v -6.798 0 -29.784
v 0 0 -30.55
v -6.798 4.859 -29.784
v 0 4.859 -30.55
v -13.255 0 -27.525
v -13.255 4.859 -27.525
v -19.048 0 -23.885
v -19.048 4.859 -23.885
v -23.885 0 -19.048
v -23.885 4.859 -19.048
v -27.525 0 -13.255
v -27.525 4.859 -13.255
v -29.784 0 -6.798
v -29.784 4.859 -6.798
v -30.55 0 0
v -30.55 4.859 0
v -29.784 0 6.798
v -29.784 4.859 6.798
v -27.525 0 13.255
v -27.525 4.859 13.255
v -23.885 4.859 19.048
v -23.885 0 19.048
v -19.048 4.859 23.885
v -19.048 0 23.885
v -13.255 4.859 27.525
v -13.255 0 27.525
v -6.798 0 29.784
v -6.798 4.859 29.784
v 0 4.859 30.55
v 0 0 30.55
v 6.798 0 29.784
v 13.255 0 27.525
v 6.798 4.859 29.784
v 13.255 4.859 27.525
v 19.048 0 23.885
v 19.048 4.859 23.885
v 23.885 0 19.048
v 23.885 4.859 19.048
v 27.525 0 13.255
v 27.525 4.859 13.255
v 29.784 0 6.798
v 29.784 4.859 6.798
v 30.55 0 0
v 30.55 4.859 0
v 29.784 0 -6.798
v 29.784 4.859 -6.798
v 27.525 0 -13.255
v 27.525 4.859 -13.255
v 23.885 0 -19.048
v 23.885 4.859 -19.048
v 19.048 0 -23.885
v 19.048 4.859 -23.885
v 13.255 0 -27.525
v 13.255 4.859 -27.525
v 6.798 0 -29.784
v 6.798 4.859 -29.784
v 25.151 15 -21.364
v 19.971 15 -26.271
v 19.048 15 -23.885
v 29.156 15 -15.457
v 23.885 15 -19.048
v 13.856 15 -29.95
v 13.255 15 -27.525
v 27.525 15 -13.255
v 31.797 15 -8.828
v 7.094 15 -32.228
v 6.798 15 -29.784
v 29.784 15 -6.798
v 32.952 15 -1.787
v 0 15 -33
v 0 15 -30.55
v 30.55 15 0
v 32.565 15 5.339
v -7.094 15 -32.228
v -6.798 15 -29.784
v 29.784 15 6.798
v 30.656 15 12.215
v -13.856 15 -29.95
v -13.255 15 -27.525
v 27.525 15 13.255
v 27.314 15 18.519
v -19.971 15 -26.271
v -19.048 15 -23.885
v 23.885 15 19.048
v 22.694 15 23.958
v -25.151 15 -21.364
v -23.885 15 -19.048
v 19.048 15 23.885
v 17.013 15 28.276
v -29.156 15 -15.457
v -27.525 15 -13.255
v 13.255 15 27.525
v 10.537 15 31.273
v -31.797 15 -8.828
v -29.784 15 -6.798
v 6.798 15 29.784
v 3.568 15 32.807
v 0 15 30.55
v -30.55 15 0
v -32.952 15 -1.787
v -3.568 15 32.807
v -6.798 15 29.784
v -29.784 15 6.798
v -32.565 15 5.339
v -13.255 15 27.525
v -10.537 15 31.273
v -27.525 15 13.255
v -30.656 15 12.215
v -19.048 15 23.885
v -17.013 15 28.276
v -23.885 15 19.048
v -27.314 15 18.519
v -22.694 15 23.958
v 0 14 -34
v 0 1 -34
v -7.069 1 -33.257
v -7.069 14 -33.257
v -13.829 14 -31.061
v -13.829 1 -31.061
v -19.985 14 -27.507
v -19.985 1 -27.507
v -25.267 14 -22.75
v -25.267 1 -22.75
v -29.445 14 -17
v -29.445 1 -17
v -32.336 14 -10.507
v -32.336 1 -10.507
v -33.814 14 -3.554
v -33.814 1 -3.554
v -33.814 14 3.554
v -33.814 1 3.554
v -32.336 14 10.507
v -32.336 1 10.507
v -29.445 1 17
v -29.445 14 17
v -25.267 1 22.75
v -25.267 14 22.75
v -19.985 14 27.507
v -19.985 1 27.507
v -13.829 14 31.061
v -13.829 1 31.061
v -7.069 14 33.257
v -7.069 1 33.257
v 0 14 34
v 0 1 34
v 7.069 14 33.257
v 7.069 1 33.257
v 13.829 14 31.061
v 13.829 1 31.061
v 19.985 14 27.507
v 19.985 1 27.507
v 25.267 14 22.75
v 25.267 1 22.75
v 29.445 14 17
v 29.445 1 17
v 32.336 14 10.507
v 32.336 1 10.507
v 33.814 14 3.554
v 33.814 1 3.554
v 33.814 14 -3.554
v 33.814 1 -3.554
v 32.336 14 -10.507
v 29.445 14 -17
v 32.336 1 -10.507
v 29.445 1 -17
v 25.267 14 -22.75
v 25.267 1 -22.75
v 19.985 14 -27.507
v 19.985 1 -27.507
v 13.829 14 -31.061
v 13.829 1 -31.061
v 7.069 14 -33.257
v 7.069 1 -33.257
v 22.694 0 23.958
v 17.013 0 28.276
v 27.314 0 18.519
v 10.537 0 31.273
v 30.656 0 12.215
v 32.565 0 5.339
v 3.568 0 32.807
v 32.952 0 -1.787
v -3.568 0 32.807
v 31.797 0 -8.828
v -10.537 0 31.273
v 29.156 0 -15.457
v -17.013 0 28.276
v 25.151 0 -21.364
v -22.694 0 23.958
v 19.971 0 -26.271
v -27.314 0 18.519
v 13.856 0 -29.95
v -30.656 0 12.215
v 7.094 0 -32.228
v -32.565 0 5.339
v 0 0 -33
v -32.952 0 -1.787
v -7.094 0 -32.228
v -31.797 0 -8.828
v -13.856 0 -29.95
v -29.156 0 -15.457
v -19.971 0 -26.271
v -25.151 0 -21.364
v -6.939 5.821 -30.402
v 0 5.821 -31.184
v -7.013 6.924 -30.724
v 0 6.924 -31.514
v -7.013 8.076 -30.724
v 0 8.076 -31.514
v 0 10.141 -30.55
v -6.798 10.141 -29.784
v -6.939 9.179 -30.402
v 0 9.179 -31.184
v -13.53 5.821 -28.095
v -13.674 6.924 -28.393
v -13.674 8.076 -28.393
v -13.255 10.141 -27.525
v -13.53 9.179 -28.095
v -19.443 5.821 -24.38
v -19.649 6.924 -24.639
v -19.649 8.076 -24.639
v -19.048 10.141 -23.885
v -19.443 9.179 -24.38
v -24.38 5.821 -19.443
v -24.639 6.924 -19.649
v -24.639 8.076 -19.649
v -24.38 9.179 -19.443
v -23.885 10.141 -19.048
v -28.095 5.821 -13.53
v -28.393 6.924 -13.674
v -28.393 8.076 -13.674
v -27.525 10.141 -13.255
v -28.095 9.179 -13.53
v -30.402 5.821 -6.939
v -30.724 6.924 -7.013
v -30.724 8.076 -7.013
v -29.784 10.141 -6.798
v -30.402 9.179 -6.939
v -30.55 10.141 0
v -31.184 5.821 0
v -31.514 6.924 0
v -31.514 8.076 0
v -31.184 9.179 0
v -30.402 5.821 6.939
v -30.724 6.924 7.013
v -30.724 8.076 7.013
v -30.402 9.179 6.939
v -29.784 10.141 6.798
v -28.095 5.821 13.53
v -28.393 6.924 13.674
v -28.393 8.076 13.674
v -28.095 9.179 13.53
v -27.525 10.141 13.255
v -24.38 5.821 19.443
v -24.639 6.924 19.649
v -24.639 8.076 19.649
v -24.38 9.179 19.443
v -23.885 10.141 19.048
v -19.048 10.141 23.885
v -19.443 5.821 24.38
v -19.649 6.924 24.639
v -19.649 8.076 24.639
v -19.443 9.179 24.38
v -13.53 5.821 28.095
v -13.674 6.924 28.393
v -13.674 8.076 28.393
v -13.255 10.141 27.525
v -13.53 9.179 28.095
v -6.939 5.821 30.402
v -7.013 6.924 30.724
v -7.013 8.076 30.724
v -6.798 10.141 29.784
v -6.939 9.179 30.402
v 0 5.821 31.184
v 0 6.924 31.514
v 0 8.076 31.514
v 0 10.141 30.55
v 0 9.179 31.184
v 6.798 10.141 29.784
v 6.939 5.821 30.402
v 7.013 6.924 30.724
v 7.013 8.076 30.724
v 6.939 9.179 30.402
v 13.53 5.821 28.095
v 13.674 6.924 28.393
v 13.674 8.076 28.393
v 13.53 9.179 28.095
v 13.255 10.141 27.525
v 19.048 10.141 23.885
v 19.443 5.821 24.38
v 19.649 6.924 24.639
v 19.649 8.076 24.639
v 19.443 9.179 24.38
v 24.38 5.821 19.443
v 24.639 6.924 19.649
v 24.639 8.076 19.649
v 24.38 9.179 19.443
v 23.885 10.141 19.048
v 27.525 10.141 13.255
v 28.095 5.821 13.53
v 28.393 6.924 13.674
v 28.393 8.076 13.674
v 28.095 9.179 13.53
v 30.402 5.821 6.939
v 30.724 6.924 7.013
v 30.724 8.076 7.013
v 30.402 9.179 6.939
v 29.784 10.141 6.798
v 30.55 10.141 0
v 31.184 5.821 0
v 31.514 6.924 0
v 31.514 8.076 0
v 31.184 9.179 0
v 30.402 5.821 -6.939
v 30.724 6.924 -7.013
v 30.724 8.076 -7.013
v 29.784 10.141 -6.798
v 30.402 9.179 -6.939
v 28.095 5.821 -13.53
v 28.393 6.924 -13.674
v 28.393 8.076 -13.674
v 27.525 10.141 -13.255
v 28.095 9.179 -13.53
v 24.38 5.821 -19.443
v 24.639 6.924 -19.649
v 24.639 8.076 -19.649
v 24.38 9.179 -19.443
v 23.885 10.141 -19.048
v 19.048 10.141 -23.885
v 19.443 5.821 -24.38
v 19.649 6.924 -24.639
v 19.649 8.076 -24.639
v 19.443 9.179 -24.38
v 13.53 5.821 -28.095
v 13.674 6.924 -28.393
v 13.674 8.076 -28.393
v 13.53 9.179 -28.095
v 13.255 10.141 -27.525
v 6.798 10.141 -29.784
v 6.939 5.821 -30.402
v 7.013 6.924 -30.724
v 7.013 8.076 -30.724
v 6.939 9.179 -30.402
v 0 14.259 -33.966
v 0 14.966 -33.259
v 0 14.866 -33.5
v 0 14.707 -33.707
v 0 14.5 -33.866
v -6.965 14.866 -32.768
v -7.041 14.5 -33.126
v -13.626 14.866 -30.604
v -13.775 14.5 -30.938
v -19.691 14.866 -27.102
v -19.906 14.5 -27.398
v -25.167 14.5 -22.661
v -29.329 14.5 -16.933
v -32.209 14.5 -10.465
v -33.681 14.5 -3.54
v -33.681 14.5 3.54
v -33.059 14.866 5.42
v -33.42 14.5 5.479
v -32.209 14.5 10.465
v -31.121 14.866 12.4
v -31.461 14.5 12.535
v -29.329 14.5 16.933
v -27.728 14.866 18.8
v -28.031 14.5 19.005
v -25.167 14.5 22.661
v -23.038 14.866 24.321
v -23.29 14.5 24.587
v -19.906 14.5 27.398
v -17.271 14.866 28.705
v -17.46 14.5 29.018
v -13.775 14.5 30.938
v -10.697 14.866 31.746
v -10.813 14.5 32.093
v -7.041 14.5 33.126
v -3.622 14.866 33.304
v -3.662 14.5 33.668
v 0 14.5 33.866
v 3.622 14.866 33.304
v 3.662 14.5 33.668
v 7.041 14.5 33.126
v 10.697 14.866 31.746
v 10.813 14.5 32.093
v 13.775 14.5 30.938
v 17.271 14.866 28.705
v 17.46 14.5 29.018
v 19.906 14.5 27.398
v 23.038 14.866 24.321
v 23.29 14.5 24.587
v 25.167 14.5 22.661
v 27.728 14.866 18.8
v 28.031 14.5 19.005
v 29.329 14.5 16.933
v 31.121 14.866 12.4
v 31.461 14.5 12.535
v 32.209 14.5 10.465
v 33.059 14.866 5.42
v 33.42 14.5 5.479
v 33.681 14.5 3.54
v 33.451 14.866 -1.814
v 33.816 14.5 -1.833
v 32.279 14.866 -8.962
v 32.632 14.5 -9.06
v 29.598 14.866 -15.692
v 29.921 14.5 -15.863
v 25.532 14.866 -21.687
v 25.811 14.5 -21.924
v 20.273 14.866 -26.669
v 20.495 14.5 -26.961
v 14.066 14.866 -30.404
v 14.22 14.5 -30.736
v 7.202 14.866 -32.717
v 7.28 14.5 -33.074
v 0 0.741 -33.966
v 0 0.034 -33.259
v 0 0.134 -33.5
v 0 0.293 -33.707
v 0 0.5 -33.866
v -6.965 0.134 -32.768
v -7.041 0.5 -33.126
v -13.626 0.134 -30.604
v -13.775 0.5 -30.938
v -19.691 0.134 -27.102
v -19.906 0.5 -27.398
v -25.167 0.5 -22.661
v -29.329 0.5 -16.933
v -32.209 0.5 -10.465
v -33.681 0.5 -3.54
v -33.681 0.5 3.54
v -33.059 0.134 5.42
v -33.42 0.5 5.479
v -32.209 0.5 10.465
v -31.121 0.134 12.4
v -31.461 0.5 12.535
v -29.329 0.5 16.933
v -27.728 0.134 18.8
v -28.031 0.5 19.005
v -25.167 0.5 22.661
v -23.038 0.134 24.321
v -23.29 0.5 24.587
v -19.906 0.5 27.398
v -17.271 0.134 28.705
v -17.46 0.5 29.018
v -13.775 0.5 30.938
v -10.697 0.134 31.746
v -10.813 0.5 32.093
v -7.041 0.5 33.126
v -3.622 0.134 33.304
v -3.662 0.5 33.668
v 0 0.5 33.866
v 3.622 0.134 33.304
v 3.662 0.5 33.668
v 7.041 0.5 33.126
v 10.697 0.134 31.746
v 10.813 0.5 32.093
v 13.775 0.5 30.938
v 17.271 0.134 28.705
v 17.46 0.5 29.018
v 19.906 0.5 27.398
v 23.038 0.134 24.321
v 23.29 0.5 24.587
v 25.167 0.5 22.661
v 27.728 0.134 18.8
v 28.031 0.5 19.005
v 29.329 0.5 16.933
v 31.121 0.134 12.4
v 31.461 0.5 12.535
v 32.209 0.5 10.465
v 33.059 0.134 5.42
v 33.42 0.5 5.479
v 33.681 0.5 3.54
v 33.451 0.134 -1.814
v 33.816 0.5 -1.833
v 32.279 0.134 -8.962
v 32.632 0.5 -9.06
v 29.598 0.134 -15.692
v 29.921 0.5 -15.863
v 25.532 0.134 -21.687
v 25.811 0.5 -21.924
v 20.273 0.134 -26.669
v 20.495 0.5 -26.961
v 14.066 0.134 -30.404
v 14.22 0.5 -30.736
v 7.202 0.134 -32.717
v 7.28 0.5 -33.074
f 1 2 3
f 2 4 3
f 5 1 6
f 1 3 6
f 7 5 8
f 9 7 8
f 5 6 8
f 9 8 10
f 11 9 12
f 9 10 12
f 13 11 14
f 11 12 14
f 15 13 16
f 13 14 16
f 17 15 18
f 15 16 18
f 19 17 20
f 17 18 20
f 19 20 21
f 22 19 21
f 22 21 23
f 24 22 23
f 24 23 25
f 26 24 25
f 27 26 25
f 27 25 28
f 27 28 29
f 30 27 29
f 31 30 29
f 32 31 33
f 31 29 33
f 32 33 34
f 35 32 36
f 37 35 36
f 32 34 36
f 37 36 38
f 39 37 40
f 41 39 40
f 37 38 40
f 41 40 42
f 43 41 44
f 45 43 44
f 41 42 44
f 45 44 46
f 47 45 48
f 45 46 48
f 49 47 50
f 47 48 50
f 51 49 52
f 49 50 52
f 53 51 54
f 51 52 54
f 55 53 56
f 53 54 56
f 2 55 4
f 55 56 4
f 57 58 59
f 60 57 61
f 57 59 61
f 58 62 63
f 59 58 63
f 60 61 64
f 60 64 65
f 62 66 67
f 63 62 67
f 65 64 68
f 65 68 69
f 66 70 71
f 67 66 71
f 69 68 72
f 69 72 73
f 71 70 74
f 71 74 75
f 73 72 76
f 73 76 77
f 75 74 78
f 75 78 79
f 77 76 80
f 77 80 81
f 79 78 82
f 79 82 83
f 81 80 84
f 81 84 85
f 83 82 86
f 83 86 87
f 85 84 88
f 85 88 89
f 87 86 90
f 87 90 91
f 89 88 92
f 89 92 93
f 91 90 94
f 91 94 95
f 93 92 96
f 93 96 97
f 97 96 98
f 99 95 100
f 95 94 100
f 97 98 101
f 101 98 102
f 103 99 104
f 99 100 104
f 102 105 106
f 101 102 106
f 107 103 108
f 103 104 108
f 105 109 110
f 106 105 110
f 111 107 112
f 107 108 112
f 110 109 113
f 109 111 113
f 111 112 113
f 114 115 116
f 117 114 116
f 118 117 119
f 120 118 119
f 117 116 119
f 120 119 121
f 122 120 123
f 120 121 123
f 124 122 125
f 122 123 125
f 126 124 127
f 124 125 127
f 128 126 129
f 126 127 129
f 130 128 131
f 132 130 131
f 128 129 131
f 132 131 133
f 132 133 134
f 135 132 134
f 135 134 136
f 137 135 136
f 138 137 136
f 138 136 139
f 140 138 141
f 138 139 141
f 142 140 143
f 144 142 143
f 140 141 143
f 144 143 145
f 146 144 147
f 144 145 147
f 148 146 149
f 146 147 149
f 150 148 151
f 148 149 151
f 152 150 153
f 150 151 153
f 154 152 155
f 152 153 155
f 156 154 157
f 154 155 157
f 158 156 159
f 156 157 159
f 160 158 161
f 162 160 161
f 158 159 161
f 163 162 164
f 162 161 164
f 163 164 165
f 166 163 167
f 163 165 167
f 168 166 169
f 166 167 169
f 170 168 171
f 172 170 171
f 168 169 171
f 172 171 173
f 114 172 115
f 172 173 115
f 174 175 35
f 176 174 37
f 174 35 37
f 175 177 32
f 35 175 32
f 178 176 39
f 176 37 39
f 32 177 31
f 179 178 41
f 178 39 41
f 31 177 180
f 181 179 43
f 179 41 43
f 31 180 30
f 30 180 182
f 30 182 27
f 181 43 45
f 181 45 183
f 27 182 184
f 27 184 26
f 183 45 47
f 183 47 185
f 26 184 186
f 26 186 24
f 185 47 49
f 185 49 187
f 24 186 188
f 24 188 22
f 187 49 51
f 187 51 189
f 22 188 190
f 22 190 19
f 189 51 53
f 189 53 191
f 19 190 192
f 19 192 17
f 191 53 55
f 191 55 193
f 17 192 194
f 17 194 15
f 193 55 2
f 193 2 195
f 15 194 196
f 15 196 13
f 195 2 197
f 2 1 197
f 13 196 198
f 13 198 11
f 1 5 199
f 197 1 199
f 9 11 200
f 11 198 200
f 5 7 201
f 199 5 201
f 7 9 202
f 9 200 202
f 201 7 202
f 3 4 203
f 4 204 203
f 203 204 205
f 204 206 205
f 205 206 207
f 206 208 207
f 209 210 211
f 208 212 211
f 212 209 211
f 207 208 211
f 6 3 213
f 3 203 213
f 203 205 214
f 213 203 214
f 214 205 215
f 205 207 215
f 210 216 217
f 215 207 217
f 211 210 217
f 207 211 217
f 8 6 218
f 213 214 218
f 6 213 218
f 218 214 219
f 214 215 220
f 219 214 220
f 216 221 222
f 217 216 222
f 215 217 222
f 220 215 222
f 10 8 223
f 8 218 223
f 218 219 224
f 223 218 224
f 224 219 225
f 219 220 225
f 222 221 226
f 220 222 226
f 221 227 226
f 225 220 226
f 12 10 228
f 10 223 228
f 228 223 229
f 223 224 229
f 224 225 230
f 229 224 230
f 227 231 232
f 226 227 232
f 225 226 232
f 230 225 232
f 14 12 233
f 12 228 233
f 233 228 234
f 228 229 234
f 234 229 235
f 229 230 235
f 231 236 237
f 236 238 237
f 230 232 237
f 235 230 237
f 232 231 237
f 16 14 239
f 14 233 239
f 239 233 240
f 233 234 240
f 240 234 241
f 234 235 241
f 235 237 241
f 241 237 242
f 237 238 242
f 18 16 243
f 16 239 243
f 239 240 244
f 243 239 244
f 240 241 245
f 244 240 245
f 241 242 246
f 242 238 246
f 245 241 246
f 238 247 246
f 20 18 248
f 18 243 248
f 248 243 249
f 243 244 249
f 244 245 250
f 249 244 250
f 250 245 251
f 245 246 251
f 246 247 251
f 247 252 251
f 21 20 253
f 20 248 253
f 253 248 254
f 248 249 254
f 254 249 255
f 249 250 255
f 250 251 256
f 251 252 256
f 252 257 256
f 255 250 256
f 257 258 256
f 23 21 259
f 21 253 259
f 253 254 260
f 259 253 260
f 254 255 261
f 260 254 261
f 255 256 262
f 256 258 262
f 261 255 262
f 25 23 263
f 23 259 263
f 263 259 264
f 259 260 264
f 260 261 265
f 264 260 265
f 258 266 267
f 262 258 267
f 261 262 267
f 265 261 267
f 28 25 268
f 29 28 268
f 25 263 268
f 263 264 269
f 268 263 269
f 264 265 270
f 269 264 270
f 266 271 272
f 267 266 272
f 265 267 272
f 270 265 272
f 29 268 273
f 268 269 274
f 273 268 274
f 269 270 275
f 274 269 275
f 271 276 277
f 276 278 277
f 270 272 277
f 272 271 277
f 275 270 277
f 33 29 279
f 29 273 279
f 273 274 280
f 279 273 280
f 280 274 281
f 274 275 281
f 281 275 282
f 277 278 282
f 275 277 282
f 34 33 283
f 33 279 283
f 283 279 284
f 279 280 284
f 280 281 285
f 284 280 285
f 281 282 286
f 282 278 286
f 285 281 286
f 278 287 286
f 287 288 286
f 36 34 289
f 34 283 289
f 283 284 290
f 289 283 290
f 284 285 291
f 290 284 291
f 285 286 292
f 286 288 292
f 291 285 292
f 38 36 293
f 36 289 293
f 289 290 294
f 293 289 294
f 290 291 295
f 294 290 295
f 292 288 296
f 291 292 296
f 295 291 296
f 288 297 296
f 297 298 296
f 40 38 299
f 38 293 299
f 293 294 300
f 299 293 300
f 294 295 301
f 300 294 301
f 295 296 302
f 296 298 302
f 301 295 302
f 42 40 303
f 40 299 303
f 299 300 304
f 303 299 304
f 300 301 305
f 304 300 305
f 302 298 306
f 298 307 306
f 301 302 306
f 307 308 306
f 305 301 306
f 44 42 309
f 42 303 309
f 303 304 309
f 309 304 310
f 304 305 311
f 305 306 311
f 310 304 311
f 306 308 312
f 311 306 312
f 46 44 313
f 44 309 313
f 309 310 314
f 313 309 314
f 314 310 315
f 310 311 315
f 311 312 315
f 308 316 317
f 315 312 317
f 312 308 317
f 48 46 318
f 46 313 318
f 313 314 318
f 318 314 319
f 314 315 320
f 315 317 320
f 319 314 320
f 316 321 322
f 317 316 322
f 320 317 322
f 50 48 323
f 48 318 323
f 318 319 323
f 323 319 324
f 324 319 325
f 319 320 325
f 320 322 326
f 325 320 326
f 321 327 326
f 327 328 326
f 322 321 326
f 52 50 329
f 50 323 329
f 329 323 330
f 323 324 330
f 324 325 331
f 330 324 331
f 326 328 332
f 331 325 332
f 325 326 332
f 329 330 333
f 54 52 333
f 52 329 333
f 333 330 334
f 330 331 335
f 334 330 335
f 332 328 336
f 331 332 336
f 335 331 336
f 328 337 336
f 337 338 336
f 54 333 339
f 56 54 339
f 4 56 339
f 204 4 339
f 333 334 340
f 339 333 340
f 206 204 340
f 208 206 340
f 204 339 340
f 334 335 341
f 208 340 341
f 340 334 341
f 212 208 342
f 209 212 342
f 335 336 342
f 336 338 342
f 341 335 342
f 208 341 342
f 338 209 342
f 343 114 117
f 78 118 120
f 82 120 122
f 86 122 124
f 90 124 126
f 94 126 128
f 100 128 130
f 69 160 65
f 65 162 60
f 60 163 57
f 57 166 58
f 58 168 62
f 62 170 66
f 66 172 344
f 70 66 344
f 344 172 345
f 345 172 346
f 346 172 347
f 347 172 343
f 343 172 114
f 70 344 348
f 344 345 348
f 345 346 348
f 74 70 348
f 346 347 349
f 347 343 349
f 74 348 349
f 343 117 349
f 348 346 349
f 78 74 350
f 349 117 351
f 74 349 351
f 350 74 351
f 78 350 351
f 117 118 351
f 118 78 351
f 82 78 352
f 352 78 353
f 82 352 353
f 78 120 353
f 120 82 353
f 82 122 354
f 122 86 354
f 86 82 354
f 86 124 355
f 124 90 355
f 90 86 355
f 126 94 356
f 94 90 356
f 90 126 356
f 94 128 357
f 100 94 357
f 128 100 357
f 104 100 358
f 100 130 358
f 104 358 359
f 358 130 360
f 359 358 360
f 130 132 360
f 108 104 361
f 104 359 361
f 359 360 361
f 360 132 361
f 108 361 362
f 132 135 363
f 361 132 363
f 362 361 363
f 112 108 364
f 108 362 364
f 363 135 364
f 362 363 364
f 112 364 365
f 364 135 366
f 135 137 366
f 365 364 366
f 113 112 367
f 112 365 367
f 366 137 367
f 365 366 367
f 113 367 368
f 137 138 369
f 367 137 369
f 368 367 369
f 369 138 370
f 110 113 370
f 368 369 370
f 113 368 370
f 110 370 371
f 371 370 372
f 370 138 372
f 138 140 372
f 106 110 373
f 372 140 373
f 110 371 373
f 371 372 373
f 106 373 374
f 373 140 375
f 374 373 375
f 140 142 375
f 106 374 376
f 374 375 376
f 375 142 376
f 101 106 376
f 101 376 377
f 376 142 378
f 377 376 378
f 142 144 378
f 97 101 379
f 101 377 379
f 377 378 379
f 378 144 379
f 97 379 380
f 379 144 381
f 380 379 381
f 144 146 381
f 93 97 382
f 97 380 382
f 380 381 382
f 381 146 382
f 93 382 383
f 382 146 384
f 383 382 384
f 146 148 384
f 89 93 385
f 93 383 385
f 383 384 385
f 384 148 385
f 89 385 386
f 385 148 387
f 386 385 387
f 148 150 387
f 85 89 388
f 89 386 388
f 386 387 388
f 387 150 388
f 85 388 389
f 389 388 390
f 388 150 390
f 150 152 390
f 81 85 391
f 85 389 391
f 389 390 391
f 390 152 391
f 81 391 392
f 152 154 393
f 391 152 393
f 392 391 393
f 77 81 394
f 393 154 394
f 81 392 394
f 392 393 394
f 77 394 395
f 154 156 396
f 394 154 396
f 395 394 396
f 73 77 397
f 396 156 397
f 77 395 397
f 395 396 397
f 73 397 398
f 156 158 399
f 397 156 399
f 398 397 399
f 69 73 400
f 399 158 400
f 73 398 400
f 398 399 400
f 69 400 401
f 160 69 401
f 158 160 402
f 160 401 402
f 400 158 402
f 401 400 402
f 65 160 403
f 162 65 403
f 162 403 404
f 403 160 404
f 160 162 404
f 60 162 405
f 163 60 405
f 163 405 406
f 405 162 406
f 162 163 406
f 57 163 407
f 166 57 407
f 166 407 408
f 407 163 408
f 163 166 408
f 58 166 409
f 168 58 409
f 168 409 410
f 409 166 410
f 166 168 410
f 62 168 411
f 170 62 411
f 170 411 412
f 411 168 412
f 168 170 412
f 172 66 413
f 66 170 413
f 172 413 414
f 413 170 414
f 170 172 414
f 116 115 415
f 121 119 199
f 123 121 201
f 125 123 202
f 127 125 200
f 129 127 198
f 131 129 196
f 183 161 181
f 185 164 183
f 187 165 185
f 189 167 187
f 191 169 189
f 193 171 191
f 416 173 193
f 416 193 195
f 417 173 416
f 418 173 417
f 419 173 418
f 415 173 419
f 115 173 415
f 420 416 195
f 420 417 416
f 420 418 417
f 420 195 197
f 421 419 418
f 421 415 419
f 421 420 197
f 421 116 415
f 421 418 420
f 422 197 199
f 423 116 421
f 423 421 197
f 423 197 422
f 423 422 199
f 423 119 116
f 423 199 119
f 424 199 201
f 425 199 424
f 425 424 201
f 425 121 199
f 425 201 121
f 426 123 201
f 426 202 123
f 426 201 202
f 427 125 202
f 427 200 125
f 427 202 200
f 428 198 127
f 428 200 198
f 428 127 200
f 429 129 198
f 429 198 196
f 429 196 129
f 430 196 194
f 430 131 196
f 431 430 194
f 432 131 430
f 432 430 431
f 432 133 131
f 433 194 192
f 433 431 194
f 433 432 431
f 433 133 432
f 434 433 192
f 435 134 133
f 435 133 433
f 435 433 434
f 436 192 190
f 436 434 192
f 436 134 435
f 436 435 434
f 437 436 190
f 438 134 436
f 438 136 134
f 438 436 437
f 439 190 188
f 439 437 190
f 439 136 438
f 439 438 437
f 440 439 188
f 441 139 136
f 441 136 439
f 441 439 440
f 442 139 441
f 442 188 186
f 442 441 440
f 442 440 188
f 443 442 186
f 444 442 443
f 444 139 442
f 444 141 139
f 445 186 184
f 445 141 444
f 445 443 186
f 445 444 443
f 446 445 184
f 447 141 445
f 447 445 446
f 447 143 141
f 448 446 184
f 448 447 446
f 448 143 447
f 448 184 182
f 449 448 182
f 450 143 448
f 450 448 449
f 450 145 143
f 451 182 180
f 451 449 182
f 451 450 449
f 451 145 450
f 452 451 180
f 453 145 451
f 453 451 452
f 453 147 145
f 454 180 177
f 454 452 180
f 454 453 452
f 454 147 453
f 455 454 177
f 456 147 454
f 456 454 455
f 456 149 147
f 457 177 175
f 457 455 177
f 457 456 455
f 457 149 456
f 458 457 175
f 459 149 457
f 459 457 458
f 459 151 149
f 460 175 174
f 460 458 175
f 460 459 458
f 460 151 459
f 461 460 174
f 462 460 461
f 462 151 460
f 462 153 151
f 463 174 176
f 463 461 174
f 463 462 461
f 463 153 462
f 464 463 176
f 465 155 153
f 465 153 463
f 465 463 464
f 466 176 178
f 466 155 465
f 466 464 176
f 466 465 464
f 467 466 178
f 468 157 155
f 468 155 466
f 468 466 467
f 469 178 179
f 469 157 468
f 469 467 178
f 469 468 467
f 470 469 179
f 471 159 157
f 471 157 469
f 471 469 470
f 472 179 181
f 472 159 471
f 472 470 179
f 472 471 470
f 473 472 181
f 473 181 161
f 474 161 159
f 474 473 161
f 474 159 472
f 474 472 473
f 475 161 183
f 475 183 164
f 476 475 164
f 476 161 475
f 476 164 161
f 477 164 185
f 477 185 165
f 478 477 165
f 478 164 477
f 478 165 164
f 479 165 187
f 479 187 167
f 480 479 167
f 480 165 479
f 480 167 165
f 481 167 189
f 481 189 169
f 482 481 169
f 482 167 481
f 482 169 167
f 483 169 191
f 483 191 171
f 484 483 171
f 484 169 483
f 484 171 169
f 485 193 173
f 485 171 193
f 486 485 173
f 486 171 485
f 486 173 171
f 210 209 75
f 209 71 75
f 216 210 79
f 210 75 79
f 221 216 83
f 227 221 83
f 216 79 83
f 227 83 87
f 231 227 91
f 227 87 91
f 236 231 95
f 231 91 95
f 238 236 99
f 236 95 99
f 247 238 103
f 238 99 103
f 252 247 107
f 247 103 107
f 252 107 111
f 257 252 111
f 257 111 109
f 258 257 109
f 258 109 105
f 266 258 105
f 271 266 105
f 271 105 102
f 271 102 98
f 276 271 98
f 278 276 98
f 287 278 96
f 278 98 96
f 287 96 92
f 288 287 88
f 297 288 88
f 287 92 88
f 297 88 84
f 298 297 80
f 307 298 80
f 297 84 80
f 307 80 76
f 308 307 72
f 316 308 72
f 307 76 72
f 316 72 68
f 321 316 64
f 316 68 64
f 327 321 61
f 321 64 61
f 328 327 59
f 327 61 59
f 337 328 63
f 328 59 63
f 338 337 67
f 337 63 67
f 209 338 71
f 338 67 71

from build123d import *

# Parameters (mm, degrees)
FILLET1_R = 1


with BuildPart() as part:
    # Sketch1 → Revolve1 (revolve)
    with BuildSketch(Plane.XY, mode=Mode.PRIVATE) as revolve1_sk:
        with BuildLine():
            Line((-34, 0), (-30.55, 0))
            Line((-30.55, 0), (-30.55, 4.859058821))
            ThreePointArc((-30.55, 4.859058821), (-31.55625, 7.5), (-30.55, 10.140941179))
            Line((-30.55, 10.140941179), (-30.55, 15))
            Line((-30.55, 15), (-34, 15))
            Line((-34, 15), (-34, 0))
        make_face()
    revolve(revolve1_sk.sketch.rotate(Axis((0, 0, 0), (0, 1, 0)), 270), axis=Axis((0, 0, 0), (0, 1, 0)))

    # Fillet1
    fillet1_edges = [part.edges().sort_by_distance(p)[0] for p in [
        (0, 0, 34),
        (0, 15, 34),
    ]]
    fillet(fillet1_edges, radius=FILLET1_R)


solid = part.part
